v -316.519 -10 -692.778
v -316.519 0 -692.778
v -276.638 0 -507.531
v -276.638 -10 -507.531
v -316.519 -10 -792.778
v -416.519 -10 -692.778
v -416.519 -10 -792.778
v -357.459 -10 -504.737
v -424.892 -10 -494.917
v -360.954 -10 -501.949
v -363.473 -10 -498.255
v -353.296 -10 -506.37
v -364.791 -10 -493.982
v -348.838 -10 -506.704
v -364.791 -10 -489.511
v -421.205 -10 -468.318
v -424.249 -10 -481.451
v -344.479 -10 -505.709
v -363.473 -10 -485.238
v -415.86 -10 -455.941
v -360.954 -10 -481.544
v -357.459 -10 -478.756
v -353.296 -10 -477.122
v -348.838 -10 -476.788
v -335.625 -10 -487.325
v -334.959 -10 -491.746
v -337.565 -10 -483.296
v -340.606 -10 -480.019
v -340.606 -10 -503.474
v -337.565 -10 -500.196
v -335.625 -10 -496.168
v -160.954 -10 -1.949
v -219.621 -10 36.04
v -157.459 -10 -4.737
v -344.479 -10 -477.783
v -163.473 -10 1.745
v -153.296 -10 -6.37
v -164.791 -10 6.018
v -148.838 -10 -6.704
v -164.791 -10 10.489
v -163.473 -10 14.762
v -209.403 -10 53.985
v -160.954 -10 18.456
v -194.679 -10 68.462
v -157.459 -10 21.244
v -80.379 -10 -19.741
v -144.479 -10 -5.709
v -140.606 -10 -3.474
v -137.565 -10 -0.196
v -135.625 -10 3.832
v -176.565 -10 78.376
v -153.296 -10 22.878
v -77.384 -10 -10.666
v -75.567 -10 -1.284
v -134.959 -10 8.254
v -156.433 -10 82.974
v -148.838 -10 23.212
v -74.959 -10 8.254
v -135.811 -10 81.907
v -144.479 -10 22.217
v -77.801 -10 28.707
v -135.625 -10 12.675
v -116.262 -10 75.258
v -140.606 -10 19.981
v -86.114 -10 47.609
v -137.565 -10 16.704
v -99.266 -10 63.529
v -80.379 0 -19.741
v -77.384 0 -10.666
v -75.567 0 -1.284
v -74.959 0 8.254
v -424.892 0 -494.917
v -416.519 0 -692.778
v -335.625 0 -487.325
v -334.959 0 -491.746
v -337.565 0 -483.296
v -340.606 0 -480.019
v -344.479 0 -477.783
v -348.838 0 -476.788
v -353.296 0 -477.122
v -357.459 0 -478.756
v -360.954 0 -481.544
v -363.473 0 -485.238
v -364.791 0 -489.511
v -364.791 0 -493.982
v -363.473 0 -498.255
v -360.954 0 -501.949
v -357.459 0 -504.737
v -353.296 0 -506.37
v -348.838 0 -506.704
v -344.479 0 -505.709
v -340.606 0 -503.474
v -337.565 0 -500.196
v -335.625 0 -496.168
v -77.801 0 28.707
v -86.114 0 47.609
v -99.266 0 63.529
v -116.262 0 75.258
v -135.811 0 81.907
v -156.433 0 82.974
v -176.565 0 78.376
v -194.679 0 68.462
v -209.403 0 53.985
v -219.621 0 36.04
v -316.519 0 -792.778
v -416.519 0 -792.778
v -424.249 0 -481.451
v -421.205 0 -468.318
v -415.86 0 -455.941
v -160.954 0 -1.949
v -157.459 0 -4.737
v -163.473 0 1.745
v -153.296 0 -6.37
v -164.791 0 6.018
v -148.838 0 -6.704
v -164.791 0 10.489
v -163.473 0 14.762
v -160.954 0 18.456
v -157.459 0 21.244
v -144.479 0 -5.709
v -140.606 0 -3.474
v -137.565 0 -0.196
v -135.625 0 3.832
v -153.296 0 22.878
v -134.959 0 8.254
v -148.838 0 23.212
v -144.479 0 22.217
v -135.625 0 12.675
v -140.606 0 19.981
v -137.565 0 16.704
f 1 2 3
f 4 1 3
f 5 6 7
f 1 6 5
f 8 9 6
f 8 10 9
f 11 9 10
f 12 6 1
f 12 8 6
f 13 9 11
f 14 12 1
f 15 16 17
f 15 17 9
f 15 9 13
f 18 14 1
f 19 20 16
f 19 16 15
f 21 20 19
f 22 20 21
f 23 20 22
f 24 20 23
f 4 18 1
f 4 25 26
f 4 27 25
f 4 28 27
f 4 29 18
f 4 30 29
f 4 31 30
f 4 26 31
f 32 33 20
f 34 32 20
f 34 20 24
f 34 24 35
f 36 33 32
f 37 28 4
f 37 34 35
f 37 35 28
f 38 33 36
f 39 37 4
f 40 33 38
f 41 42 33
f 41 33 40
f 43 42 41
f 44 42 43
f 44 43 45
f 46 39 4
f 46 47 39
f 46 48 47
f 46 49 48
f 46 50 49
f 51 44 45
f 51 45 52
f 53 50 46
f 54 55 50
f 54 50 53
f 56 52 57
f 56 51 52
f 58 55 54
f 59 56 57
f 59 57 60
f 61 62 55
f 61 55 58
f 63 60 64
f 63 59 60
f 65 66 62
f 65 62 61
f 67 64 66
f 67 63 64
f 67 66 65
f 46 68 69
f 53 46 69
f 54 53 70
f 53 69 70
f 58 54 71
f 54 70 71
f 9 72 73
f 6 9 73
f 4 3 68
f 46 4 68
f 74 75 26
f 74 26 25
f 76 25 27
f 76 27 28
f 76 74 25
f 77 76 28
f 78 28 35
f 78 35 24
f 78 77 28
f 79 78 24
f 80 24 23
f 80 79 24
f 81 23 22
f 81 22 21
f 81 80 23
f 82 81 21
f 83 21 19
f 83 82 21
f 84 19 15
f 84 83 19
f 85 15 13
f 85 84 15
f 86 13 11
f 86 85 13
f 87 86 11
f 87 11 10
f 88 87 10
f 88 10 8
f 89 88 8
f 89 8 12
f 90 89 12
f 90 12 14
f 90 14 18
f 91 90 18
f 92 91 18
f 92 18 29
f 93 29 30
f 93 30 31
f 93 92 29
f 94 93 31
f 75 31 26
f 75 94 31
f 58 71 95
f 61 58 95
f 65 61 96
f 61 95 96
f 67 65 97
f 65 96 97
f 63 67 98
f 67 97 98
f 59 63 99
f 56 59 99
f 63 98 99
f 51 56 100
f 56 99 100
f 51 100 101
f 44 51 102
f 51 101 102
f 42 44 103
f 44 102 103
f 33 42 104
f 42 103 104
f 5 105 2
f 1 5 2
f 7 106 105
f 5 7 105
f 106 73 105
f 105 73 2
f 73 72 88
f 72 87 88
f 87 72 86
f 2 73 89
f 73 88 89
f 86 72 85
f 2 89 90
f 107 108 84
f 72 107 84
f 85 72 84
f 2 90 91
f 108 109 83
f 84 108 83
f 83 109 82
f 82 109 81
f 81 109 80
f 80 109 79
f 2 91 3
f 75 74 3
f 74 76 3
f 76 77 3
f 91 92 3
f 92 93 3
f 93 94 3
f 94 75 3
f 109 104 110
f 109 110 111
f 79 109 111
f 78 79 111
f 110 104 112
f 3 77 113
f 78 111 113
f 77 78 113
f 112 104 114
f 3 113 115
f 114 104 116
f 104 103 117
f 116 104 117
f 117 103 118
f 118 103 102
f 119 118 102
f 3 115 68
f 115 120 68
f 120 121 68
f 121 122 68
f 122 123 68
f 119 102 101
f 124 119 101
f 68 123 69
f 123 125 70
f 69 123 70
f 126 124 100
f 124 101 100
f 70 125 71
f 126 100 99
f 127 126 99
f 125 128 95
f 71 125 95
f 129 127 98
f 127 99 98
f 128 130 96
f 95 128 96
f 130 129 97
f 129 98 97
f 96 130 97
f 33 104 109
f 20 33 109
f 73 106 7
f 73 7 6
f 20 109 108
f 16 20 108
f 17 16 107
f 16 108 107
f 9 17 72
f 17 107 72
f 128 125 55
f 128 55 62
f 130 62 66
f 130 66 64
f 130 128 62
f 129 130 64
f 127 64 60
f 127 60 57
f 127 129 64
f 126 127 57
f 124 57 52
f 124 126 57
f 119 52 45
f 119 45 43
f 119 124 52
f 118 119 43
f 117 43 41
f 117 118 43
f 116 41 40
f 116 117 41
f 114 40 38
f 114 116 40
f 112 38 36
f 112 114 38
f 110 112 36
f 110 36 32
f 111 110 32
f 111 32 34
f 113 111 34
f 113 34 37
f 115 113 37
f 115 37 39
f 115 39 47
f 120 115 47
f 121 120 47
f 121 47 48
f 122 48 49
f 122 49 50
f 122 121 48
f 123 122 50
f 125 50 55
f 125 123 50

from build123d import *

# Parameters (mm, degrees)
F0_W     = 100
F0_H     = 100
F0_R     = 15
F1_DEPTH = 10


# Not quite as in the source:
# - a feature names something its author has since deleted; it is built from what else it names


with BuildPart() as f1:
    # F0 (on Front) → F1 (new body)
    with BuildSketch(Plane.XZ):
        with Locations((-366.5186442992, -742.7781961888)):
            Rectangle(F0_W, F0_H)
        with BuildLine():
            Line((-424.891556994, -494.917224318), (-416.5186442992, -692.7781961888))
            Line((-416.5186442992, -692.7781961888), (-316.5186442992, -692.7781961888))
            Line((-316.5186442992, -692.7781961888), (-276.6384194866, -507.5307060219))
            ThreePointArc((-276.6384194866, -507.5307060219), (-356.3167020216, -566.4762885136), (-424.891556994, -494.917224318))
        make_face()
        with BuildLine():
            ThreePointArc((-415.8601836979, -455.9414735734), (-423.022745475, -474.8160209943), (-424.891556994, -494.917224318))
            ThreePointArc((-424.891556994, -494.917224318), (-356.3167020216, -566.4762885136), (-276.6384194866, -507.5307060219))
            ThreePointArc((-276.6384194866, -507.5307060219), (-275.3797520239, -499.6830567418), (-274.9586197372, -491.7462758703))
            ThreePointArc((-274.9586197372, -491.7462758703), (-331.4872540196, -419.0564646962), (-415.8601836979, -455.9414735734))
        make_face()
        with Locations((-349.9586197372, -491.7462758703)):
            Circle(F0_R, mode=Mode.SUBTRACT)
        with BuildLine():
            ThreePointArc((-274.9586197372, -491.7462758703), (-275.3797520239, -499.6830567418), (-276.6384194866, -507.5307060219))
            Line((-276.6384194866, -507.5307060219), (-80.3792470285, -19.7411127776))
            ThreePointArc((-80.3792470285, -19.7411127776), (-177.8494040627, -61.3674231584), (-219.6213859991, 36.0403935367))
            Line((-219.6213859991, 36.0403935367), (-415.8601836979, -455.9414735734))
            ThreePointArc((-415.8601836979, -455.9414735734), (-331.4872540196, -419.0564646962), (-274.9586197372, -491.7462758703))
        make_face()
        with BuildLine():
            ThreePointArc((-219.6213859991, 36.0403935367), (-177.8494040627, -61.3674231584), (-80.3792470285, -19.7411127776))
            ThreePointArc((-80.3792470285, -19.7411127776), (-76.3262459022, -6.0036782783), (-74.9586197372, 8.2537241297))
            ThreePointArc((-74.9586197372, 8.2537241297), (-135.8113138036, 81.9073305236), (-219.6213859991, 36.0403935367))
        make_face()
        with Locations((-149.9586197372, 8.2537241297)):
            Circle(F0_R, mode=Mode.SUBTRACT)
    extrude(amount=F1_DEPTH)


solid = f1.part
